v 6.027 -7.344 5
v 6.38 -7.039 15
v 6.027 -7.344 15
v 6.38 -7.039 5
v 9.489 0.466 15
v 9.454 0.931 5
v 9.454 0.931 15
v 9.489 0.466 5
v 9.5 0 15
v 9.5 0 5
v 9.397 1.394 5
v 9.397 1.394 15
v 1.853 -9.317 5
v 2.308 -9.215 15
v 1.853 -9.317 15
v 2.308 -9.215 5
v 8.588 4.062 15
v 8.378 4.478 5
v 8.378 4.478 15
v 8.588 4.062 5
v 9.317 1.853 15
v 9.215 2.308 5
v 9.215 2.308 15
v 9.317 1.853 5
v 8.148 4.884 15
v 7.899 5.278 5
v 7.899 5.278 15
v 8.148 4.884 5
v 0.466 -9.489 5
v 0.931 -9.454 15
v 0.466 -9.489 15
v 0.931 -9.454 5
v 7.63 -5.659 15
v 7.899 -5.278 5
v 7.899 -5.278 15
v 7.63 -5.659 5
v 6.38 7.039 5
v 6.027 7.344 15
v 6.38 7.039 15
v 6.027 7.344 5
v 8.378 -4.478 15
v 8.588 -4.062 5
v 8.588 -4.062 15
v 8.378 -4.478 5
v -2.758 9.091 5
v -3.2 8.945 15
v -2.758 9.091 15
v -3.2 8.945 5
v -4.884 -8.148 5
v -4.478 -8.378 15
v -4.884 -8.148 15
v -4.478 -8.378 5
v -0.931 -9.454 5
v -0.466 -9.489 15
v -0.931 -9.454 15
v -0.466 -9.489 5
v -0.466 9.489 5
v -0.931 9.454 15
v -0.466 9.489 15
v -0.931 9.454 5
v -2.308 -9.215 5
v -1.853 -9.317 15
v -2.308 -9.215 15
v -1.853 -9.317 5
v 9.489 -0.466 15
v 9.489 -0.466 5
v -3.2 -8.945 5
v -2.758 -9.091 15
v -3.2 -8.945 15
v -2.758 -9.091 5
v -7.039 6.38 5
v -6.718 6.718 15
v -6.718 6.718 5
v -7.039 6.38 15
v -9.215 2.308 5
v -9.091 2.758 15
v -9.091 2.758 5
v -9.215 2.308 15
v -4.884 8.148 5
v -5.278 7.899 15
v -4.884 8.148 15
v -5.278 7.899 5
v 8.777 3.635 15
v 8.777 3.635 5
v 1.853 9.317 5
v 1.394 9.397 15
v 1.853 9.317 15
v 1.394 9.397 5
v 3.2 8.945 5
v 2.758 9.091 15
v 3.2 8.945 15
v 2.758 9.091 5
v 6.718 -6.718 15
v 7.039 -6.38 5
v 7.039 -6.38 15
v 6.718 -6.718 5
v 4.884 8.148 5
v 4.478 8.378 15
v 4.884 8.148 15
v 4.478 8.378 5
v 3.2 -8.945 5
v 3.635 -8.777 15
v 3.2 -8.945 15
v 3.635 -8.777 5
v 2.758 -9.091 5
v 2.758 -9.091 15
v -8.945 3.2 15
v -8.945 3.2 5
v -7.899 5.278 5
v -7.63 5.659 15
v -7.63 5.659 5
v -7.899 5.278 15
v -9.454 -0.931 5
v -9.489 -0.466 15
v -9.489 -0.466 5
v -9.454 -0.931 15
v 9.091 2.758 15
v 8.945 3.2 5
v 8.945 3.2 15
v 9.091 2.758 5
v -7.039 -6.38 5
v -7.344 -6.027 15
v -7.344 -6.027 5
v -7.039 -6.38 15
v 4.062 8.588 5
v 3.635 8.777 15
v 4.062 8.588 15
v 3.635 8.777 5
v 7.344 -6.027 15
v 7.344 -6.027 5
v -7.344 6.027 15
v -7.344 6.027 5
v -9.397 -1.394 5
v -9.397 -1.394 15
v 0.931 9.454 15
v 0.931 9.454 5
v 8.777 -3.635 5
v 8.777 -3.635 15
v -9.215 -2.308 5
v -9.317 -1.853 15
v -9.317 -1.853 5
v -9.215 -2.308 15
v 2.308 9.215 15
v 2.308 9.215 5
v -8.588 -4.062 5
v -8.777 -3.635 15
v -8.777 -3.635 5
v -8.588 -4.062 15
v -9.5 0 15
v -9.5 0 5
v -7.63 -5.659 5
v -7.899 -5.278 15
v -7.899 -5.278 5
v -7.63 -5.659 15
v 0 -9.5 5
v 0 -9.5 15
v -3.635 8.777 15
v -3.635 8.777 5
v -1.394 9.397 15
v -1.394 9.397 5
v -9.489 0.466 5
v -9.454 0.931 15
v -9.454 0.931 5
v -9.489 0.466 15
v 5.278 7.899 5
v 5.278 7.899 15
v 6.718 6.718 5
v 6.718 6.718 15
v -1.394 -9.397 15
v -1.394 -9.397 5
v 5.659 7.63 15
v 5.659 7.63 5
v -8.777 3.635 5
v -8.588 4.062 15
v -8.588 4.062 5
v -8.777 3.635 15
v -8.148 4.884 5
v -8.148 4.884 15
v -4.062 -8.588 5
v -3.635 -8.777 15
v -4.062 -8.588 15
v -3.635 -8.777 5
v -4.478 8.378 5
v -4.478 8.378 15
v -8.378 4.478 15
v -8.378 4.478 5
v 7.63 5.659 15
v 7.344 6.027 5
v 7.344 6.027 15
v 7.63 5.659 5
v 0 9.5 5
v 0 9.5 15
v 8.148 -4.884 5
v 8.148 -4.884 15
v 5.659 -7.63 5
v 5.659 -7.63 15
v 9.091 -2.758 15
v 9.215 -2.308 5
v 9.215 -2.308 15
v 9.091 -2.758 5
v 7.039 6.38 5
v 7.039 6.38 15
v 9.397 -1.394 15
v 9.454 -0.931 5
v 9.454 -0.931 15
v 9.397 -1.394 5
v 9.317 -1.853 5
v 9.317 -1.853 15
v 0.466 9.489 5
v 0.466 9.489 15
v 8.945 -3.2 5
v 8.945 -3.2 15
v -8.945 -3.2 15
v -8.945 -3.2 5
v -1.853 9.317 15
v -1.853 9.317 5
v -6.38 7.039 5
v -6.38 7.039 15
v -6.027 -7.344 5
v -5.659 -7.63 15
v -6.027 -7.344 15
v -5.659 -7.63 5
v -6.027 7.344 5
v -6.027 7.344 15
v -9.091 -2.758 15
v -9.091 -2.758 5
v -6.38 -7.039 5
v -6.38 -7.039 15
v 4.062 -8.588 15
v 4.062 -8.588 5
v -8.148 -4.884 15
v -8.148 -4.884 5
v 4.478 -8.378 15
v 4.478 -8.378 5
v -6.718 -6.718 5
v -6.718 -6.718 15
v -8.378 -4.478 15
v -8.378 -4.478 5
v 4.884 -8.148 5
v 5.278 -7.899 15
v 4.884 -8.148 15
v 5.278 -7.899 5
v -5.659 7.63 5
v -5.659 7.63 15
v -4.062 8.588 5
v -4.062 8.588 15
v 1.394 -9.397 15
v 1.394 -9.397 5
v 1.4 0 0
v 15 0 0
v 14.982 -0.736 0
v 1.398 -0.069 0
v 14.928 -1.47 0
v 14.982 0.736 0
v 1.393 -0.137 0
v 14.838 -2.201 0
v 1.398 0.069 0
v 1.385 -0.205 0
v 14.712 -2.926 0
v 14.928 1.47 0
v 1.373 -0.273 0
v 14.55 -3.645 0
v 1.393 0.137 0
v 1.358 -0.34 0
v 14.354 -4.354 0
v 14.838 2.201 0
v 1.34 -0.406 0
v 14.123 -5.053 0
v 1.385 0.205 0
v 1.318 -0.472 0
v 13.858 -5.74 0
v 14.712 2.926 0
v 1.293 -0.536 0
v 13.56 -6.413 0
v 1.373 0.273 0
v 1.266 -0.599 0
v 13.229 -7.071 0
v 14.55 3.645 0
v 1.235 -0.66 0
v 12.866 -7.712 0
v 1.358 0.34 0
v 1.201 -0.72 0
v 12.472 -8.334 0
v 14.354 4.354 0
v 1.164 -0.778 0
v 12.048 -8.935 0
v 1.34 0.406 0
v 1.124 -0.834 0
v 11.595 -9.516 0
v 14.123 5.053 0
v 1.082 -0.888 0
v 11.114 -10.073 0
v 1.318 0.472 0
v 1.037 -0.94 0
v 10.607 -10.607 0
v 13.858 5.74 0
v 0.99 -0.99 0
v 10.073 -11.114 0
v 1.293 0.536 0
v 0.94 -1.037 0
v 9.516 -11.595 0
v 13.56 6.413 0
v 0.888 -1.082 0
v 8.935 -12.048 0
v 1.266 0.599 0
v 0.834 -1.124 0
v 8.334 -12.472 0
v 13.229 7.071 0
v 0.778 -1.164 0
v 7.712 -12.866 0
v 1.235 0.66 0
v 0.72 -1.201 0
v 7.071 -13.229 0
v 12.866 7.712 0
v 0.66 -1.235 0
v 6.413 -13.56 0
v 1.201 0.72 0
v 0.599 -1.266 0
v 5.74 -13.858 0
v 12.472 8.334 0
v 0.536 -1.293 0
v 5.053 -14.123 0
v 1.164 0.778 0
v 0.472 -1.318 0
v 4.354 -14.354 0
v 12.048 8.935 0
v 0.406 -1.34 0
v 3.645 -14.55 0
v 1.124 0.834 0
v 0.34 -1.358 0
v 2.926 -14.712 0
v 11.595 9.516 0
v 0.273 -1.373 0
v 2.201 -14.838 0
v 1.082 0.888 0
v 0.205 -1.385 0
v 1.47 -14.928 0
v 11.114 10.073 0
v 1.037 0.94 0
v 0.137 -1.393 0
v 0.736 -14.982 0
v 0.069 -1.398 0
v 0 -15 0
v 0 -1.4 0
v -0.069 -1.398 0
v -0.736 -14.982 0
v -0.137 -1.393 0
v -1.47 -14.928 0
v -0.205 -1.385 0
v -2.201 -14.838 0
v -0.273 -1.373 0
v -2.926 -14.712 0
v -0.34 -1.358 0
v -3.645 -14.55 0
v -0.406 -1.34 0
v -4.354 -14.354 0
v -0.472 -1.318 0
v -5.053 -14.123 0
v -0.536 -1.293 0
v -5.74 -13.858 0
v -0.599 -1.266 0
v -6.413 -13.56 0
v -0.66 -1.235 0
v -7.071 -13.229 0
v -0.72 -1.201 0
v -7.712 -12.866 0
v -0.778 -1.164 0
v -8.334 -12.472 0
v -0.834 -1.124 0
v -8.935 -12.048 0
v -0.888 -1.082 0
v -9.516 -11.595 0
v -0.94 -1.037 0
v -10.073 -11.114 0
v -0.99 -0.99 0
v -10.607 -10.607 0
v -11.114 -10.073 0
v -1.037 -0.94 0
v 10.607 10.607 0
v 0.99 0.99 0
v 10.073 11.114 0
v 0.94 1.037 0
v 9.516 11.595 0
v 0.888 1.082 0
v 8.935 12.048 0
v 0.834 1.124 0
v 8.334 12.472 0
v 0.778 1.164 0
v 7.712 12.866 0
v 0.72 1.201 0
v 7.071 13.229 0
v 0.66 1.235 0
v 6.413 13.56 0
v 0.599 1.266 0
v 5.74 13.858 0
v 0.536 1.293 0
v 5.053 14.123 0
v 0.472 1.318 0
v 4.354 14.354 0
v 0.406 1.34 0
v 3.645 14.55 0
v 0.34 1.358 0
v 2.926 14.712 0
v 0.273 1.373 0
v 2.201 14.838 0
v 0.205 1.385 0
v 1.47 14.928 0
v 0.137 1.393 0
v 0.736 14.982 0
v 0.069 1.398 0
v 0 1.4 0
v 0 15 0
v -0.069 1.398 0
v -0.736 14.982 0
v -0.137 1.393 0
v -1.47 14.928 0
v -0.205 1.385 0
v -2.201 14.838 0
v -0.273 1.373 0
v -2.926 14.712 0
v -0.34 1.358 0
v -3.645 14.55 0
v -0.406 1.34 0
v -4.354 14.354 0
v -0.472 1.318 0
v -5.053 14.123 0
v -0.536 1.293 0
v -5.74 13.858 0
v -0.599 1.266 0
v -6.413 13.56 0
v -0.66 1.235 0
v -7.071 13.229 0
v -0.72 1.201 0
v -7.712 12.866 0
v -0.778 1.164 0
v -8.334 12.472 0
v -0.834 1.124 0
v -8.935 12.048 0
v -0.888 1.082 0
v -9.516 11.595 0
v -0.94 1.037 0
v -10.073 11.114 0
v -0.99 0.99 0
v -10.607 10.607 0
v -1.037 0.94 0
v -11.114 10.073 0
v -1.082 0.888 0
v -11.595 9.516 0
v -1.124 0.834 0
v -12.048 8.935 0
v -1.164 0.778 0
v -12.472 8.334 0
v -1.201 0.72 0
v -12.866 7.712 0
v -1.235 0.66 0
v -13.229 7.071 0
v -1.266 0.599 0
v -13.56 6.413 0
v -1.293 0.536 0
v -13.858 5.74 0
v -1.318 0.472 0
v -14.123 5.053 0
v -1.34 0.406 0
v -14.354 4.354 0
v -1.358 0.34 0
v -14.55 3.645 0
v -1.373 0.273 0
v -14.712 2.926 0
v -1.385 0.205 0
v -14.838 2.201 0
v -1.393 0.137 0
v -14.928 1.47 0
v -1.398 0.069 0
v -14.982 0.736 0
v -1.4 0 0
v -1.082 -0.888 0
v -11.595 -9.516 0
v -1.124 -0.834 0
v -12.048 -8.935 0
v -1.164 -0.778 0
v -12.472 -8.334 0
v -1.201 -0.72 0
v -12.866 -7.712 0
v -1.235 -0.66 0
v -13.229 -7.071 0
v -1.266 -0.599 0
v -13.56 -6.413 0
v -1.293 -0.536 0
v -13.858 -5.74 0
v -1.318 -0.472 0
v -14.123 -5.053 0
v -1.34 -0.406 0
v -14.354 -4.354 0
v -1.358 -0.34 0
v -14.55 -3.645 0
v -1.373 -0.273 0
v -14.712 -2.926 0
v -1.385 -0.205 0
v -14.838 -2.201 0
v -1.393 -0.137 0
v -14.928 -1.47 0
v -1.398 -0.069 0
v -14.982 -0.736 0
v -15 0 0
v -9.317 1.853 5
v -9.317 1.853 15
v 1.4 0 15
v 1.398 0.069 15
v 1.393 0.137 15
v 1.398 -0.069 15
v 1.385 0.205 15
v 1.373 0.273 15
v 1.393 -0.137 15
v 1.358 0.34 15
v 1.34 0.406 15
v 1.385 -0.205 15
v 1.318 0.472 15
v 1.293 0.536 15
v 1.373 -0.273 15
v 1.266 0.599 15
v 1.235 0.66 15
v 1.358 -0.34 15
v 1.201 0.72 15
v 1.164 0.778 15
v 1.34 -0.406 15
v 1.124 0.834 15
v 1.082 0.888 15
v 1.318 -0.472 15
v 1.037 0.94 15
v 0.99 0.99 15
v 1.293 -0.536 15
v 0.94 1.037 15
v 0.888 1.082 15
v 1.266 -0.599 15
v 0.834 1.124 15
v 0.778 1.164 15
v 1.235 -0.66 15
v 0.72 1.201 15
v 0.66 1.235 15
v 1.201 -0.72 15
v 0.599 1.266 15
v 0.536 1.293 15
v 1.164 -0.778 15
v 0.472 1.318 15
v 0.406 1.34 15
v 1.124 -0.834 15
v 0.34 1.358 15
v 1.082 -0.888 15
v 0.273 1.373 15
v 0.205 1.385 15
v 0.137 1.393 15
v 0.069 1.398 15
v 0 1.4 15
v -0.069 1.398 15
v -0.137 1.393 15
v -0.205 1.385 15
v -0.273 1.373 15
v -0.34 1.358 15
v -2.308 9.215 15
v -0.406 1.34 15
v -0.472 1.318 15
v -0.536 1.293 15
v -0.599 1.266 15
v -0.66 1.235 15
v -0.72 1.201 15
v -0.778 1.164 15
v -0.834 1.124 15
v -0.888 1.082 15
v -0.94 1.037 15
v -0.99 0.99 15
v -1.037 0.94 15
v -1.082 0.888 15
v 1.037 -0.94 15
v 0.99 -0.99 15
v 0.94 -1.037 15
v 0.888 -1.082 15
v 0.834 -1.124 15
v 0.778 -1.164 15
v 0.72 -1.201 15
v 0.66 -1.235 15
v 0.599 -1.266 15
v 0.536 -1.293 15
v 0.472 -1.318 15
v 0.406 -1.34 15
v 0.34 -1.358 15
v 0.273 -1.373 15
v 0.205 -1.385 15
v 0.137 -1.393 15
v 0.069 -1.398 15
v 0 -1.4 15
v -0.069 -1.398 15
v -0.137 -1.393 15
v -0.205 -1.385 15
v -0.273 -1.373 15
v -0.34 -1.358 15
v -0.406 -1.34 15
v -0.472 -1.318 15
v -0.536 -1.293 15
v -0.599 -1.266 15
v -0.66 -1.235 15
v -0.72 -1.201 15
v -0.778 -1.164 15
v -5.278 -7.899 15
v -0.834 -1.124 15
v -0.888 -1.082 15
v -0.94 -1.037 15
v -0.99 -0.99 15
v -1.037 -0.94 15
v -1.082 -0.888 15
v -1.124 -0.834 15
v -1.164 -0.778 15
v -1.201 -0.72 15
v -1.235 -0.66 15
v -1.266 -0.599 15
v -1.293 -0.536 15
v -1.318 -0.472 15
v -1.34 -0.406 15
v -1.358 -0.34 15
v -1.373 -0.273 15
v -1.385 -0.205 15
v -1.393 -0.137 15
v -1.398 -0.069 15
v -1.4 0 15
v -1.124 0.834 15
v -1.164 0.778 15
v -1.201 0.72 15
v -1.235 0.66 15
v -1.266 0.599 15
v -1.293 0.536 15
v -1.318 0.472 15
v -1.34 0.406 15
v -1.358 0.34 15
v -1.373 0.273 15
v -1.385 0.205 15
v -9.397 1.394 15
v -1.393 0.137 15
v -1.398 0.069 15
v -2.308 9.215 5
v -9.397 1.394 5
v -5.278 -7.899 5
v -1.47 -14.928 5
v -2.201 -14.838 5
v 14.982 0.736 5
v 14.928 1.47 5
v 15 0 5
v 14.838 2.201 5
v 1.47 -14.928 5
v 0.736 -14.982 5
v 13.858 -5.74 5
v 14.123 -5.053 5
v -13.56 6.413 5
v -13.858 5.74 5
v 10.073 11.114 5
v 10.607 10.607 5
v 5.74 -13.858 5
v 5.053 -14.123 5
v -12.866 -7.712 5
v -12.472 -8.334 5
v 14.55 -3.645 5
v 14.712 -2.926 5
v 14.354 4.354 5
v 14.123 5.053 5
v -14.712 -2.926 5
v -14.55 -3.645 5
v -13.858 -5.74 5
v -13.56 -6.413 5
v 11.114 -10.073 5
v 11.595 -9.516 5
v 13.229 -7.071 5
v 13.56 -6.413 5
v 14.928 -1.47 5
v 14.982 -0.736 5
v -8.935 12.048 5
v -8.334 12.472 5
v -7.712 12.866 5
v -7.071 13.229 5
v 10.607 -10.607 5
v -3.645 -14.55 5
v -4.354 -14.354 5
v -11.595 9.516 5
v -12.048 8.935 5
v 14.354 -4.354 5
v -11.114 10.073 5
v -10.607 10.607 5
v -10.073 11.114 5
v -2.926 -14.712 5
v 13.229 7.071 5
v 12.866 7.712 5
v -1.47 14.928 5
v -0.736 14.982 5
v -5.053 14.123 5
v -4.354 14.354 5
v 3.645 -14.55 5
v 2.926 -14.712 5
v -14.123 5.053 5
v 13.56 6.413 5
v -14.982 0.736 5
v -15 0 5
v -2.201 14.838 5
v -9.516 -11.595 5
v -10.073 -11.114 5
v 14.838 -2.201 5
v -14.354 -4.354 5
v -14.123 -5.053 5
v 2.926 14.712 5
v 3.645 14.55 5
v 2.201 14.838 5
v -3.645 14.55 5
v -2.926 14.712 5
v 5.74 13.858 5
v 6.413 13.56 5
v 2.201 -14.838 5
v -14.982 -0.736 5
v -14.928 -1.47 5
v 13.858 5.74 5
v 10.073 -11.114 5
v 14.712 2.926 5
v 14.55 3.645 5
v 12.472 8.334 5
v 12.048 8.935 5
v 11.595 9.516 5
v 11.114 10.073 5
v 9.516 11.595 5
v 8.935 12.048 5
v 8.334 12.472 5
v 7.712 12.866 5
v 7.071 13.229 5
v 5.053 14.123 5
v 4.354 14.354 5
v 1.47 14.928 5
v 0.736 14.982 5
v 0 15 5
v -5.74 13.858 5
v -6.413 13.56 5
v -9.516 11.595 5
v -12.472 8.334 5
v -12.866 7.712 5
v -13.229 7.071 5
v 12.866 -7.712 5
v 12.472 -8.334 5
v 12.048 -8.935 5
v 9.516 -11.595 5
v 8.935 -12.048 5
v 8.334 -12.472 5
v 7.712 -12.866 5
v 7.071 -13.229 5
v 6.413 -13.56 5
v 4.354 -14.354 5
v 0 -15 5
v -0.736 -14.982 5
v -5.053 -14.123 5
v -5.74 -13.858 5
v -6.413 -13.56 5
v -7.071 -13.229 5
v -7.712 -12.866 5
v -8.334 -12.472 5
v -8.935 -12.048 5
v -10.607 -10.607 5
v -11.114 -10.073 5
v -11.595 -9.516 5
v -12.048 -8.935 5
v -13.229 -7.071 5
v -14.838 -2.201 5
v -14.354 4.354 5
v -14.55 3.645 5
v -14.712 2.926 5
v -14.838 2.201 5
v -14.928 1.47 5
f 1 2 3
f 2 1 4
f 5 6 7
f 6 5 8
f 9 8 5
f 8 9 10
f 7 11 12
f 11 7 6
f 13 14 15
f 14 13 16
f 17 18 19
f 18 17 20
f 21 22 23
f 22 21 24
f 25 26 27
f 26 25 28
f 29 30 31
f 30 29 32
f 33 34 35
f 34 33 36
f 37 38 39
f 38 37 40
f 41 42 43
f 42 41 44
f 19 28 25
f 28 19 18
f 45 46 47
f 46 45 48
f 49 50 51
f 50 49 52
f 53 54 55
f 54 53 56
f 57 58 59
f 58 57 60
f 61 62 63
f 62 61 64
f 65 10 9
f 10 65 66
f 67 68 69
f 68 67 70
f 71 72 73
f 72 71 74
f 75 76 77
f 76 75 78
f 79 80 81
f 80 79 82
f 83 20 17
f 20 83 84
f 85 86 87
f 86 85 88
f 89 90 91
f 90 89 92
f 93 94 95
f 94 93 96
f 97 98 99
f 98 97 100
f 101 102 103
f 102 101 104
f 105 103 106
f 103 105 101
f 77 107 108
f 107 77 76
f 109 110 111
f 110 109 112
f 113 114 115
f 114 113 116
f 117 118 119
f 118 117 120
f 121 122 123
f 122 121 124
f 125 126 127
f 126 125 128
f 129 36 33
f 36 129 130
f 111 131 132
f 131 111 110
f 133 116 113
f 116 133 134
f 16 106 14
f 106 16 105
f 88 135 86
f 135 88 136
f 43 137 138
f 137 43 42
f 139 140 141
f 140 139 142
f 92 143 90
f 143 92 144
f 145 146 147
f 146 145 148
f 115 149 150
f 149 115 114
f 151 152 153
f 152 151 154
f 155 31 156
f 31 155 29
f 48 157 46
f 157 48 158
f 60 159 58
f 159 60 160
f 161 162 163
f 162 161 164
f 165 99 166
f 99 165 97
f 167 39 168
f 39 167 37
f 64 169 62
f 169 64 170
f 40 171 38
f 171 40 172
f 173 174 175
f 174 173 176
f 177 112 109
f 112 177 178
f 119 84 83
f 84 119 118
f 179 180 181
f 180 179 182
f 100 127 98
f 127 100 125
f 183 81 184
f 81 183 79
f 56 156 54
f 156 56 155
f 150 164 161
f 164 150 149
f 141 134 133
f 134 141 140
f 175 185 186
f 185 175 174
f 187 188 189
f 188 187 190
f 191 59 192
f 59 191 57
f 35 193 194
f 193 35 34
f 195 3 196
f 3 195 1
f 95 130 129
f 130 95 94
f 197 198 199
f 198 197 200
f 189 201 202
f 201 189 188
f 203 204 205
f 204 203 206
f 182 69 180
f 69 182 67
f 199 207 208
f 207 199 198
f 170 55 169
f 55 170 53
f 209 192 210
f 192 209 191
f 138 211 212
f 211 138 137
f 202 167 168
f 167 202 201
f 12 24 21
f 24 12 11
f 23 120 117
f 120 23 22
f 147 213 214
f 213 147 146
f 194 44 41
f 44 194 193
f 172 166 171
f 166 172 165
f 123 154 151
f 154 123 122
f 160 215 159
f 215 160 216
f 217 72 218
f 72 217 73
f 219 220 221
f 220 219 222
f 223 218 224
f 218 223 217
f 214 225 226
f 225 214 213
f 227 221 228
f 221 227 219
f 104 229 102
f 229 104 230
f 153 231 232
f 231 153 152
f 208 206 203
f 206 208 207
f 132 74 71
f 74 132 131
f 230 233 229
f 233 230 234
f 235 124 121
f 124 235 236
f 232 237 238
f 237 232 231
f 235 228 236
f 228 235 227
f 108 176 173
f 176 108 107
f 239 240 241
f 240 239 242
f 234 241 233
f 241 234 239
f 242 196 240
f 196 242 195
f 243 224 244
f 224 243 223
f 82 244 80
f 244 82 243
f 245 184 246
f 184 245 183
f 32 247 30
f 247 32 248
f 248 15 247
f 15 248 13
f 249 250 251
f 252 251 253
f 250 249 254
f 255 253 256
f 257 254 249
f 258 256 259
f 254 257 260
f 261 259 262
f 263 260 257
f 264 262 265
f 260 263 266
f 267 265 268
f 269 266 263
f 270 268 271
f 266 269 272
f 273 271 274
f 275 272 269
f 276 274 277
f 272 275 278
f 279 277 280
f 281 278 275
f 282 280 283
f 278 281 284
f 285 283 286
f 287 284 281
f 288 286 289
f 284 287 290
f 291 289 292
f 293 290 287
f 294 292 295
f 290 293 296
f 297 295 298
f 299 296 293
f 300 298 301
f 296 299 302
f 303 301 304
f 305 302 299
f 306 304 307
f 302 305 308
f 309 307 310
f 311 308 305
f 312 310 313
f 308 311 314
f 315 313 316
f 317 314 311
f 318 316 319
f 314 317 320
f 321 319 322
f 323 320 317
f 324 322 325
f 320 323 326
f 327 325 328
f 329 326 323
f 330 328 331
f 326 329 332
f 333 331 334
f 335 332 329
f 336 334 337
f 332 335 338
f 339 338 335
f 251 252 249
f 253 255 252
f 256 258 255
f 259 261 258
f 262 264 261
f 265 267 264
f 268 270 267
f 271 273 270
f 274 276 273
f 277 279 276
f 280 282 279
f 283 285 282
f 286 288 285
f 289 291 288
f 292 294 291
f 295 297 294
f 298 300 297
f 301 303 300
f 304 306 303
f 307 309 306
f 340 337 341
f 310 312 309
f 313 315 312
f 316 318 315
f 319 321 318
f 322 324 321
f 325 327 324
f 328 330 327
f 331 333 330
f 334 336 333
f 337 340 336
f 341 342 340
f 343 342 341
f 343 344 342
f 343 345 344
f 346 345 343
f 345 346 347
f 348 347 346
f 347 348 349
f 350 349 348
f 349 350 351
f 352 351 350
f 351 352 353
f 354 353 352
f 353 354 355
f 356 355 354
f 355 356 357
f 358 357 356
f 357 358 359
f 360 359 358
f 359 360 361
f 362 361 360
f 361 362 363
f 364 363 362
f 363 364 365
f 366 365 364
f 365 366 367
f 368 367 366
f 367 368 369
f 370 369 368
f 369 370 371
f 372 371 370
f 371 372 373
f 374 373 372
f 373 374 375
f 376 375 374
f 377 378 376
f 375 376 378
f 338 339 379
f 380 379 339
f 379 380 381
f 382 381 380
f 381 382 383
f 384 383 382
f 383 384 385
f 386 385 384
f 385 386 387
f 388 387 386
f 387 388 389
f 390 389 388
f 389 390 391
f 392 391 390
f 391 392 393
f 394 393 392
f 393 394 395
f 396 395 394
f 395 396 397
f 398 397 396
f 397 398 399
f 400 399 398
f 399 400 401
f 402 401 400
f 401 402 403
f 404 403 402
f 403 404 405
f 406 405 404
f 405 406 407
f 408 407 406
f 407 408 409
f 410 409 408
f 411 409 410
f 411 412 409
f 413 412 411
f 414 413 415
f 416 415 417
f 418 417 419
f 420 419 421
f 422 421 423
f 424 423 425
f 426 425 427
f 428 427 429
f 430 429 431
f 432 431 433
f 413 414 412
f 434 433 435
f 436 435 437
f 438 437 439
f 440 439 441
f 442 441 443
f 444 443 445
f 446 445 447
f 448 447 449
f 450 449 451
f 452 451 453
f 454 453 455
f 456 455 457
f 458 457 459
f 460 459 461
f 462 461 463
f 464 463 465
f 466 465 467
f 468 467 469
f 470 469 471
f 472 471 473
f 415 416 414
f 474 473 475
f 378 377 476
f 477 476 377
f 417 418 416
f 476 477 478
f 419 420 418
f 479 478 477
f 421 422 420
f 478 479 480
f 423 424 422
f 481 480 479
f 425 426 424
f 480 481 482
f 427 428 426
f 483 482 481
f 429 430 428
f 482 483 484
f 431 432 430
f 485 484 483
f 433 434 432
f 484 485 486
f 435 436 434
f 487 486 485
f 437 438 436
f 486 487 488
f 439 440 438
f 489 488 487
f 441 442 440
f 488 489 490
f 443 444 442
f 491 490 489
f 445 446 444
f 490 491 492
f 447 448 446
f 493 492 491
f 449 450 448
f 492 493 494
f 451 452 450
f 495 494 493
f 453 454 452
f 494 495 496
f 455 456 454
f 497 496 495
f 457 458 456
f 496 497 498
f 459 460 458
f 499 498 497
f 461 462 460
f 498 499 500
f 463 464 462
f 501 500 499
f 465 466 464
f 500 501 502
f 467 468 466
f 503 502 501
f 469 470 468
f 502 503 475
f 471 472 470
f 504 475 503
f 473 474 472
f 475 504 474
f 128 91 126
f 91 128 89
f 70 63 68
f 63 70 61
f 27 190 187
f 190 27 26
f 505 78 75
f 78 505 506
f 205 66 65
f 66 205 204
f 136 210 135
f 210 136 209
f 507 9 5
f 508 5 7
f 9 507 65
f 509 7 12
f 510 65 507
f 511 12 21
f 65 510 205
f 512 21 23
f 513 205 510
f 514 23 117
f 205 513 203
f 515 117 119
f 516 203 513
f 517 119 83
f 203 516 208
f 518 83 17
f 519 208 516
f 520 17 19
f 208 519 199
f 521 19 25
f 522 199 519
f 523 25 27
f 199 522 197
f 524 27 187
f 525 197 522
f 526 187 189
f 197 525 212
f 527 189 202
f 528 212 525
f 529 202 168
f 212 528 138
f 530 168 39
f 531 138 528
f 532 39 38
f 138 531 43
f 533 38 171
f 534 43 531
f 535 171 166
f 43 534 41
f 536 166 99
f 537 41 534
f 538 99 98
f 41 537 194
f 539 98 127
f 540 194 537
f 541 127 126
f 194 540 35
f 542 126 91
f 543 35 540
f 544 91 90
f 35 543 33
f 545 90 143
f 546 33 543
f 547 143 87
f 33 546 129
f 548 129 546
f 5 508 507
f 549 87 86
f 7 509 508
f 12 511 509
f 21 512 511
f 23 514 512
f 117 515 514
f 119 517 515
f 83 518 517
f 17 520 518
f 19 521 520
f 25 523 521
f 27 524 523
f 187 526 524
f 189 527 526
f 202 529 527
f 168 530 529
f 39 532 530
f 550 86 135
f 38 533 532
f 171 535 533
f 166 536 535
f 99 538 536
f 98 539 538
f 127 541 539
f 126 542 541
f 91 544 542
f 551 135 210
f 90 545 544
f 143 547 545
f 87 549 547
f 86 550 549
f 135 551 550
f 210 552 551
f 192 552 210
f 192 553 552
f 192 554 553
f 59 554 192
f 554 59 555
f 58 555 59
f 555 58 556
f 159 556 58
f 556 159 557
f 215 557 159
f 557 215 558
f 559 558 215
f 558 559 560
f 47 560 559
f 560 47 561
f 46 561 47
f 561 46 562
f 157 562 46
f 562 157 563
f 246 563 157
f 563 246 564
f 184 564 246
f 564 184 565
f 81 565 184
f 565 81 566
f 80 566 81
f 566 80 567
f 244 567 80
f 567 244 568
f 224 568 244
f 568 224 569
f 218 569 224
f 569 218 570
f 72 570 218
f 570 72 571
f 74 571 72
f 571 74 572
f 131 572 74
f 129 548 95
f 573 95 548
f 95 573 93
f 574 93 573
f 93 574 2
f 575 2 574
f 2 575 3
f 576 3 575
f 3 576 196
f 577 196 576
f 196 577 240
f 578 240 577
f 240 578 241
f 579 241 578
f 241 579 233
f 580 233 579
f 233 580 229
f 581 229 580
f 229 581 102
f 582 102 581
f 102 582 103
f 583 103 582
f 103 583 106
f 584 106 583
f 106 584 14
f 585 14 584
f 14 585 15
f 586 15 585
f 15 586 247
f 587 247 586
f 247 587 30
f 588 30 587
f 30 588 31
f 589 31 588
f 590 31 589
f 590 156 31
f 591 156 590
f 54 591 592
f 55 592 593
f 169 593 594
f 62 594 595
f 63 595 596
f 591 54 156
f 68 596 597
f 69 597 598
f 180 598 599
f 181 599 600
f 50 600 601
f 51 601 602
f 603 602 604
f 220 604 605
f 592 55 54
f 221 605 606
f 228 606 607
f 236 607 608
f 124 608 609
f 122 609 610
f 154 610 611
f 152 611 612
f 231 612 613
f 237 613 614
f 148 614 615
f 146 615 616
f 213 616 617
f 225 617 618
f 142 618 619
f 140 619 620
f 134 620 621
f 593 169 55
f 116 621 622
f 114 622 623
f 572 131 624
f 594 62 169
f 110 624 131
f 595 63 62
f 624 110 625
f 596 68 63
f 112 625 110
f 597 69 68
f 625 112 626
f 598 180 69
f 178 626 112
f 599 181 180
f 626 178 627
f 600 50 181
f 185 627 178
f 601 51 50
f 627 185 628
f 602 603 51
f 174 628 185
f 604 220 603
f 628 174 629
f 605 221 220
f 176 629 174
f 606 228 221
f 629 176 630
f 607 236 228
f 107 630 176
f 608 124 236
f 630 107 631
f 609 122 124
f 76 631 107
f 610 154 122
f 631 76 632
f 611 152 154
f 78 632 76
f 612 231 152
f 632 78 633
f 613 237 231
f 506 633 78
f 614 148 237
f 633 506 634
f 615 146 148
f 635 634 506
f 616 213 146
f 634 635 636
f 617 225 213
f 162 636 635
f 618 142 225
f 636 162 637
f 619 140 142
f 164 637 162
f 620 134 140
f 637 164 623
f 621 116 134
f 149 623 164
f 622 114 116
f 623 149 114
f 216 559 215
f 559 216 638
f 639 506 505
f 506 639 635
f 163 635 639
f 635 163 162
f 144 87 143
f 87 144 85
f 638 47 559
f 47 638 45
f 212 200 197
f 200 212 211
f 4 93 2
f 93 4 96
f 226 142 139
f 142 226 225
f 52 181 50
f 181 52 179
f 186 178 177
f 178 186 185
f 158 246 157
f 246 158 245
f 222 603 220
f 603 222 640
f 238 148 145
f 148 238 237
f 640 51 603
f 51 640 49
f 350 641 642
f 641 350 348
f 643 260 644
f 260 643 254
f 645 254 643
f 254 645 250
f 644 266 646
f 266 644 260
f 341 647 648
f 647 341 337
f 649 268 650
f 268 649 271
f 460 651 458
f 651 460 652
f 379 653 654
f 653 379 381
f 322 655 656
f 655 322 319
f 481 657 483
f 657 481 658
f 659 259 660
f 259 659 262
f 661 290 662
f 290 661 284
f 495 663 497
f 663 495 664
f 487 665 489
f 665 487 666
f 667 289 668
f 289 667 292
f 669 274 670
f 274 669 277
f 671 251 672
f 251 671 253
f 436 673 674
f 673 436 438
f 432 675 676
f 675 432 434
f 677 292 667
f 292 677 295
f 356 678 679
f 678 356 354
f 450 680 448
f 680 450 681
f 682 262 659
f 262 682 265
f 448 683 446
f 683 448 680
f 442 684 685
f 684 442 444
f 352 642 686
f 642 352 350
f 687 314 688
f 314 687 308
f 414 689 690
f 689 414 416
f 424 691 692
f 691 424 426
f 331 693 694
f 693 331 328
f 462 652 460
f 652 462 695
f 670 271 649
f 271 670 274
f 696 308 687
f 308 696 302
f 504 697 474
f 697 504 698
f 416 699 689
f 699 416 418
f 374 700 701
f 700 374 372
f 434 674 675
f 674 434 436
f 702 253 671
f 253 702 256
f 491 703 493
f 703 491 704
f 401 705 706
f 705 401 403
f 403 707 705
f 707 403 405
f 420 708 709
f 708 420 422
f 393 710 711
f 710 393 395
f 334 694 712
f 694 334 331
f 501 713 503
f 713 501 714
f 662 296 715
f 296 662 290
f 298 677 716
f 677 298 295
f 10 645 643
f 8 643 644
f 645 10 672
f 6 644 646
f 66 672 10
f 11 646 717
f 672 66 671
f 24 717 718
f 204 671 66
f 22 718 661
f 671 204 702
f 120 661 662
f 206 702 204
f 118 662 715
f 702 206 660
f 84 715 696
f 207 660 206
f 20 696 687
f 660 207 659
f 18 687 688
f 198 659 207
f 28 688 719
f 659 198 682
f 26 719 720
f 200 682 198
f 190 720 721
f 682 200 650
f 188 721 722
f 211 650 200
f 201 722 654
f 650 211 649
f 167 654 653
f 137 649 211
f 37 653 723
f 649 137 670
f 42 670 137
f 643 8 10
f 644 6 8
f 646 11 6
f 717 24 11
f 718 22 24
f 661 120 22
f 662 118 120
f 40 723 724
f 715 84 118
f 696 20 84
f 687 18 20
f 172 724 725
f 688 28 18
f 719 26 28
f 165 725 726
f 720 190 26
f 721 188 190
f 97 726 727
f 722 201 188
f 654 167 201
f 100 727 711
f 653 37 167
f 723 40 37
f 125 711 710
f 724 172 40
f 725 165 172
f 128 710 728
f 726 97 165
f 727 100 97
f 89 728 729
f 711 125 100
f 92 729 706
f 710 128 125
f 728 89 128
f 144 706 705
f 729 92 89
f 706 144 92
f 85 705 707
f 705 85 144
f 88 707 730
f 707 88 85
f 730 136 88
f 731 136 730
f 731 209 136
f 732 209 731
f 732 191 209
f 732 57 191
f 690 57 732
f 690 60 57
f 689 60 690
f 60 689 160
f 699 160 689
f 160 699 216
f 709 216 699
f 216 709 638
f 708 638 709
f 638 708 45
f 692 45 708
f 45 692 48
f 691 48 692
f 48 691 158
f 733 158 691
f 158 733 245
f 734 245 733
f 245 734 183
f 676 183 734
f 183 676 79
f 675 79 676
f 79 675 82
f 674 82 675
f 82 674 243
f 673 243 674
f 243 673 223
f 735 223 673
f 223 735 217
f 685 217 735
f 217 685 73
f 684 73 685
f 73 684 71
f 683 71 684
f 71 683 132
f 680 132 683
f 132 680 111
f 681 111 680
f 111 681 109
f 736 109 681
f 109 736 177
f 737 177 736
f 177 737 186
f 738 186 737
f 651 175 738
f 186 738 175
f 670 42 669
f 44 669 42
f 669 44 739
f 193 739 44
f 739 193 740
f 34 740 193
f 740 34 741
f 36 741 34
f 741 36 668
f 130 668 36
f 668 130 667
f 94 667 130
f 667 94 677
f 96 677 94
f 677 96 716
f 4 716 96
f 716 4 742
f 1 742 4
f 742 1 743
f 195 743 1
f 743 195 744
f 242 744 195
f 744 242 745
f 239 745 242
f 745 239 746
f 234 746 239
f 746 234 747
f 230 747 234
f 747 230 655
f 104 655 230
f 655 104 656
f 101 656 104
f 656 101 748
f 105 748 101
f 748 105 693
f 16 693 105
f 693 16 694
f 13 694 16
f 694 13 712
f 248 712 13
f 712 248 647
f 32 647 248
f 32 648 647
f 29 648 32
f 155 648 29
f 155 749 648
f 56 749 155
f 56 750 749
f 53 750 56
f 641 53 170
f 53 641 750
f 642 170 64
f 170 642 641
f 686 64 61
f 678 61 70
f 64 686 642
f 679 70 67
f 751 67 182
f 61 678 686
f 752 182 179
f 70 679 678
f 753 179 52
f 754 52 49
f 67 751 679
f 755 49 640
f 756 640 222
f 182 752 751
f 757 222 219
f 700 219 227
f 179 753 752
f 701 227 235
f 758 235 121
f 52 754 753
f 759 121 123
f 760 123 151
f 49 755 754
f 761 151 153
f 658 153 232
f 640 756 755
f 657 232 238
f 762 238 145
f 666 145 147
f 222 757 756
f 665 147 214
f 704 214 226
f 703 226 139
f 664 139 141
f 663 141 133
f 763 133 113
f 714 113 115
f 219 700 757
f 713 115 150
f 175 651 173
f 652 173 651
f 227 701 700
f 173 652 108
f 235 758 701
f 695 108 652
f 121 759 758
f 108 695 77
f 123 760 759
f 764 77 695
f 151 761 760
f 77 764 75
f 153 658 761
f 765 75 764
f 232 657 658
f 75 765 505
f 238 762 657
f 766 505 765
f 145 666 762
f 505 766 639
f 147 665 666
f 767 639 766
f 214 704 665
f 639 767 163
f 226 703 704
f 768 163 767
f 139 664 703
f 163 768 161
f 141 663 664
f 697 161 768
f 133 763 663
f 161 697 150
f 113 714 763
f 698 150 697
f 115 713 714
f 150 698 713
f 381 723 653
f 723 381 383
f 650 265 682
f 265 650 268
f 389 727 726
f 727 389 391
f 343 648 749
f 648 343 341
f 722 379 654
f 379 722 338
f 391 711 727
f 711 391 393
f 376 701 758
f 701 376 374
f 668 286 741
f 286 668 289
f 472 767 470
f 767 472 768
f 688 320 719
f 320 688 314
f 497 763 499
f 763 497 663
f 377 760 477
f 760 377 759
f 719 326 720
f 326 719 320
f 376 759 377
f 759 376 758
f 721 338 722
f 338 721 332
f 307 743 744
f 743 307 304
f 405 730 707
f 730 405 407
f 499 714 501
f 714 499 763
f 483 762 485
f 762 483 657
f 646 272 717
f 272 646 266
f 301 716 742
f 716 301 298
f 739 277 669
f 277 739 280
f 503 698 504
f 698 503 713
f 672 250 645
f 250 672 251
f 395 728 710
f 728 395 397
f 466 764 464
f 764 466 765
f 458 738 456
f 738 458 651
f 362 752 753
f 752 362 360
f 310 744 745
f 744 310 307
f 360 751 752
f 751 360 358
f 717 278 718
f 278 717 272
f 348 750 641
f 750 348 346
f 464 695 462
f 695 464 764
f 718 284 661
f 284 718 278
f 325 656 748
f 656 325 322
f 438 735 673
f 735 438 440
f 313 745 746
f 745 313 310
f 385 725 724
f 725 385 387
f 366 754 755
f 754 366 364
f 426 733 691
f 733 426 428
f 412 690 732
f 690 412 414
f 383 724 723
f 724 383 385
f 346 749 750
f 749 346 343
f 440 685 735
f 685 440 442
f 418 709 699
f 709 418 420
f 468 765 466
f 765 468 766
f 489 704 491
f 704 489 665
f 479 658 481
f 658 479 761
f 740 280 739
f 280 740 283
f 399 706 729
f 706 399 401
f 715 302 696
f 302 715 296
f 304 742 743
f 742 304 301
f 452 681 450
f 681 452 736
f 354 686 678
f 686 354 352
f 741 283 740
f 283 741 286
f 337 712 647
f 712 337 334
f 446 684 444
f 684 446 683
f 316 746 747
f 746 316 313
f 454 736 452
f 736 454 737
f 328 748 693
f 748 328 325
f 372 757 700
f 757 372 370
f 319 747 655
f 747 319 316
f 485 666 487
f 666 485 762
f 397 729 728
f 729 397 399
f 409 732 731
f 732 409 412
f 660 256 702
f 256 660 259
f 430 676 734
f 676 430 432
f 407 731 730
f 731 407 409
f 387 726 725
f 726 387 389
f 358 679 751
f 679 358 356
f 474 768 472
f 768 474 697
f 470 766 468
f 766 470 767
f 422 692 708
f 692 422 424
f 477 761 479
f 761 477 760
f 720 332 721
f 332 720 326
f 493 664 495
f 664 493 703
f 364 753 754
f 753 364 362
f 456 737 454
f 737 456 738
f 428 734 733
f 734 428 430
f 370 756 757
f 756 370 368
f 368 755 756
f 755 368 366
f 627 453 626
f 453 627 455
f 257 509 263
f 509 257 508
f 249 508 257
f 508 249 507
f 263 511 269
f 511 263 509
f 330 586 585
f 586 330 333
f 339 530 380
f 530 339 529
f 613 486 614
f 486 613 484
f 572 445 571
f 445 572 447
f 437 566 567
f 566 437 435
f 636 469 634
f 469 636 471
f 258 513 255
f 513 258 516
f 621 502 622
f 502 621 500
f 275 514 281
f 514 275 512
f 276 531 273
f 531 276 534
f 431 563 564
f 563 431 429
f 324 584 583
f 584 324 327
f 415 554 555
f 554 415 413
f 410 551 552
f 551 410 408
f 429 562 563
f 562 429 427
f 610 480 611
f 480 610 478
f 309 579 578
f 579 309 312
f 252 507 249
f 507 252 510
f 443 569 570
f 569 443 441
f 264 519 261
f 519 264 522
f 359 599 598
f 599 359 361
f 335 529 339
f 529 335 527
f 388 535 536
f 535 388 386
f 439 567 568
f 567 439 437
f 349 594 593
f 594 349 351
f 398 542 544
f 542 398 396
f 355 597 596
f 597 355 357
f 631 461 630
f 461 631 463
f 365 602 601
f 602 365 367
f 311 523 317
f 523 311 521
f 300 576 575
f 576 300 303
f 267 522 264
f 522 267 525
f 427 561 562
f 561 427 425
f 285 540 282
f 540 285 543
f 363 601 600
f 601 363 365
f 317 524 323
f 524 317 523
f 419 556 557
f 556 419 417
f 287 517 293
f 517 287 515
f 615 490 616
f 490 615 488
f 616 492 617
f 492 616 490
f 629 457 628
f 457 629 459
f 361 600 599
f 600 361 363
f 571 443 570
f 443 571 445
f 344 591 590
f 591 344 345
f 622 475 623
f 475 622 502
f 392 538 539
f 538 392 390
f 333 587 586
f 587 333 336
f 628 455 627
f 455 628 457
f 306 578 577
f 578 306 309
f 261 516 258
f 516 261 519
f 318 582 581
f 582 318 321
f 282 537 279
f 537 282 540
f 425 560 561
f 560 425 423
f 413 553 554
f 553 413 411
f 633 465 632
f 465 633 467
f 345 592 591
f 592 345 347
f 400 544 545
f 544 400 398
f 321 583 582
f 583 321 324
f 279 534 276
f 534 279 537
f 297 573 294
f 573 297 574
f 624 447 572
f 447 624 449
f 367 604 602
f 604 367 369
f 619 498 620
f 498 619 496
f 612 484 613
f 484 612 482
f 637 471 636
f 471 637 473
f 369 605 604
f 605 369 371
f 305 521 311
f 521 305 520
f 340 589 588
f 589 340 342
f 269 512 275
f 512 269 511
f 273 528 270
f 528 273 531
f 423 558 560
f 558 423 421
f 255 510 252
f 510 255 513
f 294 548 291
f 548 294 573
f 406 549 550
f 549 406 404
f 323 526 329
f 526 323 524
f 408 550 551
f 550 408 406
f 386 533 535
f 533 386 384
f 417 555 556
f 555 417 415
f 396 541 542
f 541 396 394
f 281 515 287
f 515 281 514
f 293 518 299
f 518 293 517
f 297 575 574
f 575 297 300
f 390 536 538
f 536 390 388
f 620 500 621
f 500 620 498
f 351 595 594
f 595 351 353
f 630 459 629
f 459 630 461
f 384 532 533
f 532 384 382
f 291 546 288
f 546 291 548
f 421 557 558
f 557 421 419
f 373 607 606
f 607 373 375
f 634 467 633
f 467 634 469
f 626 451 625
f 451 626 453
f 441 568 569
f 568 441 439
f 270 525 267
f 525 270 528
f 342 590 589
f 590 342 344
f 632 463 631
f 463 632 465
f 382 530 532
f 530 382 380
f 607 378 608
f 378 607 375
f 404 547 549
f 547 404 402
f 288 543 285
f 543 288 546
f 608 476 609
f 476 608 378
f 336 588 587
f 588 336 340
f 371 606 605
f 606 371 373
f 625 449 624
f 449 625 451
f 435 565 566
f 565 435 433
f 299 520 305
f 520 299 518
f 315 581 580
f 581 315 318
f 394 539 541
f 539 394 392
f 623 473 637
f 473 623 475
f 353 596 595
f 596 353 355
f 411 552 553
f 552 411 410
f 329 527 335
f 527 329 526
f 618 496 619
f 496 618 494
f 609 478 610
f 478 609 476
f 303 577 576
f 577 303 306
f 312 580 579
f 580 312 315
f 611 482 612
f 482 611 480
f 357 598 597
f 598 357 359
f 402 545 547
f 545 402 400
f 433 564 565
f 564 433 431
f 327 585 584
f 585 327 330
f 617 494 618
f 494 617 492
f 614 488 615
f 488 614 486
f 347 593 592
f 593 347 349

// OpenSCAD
// Diameter of the hole the plug is plugged into
bottomDiameter = 19;
// Diameter of the top support, make this slightly smaller then the diameter of the circle you are trying to make
topDiameter = 30;
// Inner hole Diameter, adjust this to the dowel you will use for centering your material
holeDiameter = 2.8;
// Height of the top support, increase this if your tool needs more space on the bottom
topHeight = 5;
// Height of the bottom piece of the plug
bottomHeight = 10;

/* [Hidden] */
$fn = 128;
bottomRadius = bottomDiameter / 2;
topRadius = topDiameter / 2;
holeRadius = holeDiameter / 2;

totalHeight = topHeight + bottomHeight;

difference() {
  group() {
    cylinder(h = totalHeight, r = bottomRadius);
    cylinder(h = topHeight, r = topRadius);
  }
  
  cylinder(h = totalHeight + 2, r = holeRadius);
}
